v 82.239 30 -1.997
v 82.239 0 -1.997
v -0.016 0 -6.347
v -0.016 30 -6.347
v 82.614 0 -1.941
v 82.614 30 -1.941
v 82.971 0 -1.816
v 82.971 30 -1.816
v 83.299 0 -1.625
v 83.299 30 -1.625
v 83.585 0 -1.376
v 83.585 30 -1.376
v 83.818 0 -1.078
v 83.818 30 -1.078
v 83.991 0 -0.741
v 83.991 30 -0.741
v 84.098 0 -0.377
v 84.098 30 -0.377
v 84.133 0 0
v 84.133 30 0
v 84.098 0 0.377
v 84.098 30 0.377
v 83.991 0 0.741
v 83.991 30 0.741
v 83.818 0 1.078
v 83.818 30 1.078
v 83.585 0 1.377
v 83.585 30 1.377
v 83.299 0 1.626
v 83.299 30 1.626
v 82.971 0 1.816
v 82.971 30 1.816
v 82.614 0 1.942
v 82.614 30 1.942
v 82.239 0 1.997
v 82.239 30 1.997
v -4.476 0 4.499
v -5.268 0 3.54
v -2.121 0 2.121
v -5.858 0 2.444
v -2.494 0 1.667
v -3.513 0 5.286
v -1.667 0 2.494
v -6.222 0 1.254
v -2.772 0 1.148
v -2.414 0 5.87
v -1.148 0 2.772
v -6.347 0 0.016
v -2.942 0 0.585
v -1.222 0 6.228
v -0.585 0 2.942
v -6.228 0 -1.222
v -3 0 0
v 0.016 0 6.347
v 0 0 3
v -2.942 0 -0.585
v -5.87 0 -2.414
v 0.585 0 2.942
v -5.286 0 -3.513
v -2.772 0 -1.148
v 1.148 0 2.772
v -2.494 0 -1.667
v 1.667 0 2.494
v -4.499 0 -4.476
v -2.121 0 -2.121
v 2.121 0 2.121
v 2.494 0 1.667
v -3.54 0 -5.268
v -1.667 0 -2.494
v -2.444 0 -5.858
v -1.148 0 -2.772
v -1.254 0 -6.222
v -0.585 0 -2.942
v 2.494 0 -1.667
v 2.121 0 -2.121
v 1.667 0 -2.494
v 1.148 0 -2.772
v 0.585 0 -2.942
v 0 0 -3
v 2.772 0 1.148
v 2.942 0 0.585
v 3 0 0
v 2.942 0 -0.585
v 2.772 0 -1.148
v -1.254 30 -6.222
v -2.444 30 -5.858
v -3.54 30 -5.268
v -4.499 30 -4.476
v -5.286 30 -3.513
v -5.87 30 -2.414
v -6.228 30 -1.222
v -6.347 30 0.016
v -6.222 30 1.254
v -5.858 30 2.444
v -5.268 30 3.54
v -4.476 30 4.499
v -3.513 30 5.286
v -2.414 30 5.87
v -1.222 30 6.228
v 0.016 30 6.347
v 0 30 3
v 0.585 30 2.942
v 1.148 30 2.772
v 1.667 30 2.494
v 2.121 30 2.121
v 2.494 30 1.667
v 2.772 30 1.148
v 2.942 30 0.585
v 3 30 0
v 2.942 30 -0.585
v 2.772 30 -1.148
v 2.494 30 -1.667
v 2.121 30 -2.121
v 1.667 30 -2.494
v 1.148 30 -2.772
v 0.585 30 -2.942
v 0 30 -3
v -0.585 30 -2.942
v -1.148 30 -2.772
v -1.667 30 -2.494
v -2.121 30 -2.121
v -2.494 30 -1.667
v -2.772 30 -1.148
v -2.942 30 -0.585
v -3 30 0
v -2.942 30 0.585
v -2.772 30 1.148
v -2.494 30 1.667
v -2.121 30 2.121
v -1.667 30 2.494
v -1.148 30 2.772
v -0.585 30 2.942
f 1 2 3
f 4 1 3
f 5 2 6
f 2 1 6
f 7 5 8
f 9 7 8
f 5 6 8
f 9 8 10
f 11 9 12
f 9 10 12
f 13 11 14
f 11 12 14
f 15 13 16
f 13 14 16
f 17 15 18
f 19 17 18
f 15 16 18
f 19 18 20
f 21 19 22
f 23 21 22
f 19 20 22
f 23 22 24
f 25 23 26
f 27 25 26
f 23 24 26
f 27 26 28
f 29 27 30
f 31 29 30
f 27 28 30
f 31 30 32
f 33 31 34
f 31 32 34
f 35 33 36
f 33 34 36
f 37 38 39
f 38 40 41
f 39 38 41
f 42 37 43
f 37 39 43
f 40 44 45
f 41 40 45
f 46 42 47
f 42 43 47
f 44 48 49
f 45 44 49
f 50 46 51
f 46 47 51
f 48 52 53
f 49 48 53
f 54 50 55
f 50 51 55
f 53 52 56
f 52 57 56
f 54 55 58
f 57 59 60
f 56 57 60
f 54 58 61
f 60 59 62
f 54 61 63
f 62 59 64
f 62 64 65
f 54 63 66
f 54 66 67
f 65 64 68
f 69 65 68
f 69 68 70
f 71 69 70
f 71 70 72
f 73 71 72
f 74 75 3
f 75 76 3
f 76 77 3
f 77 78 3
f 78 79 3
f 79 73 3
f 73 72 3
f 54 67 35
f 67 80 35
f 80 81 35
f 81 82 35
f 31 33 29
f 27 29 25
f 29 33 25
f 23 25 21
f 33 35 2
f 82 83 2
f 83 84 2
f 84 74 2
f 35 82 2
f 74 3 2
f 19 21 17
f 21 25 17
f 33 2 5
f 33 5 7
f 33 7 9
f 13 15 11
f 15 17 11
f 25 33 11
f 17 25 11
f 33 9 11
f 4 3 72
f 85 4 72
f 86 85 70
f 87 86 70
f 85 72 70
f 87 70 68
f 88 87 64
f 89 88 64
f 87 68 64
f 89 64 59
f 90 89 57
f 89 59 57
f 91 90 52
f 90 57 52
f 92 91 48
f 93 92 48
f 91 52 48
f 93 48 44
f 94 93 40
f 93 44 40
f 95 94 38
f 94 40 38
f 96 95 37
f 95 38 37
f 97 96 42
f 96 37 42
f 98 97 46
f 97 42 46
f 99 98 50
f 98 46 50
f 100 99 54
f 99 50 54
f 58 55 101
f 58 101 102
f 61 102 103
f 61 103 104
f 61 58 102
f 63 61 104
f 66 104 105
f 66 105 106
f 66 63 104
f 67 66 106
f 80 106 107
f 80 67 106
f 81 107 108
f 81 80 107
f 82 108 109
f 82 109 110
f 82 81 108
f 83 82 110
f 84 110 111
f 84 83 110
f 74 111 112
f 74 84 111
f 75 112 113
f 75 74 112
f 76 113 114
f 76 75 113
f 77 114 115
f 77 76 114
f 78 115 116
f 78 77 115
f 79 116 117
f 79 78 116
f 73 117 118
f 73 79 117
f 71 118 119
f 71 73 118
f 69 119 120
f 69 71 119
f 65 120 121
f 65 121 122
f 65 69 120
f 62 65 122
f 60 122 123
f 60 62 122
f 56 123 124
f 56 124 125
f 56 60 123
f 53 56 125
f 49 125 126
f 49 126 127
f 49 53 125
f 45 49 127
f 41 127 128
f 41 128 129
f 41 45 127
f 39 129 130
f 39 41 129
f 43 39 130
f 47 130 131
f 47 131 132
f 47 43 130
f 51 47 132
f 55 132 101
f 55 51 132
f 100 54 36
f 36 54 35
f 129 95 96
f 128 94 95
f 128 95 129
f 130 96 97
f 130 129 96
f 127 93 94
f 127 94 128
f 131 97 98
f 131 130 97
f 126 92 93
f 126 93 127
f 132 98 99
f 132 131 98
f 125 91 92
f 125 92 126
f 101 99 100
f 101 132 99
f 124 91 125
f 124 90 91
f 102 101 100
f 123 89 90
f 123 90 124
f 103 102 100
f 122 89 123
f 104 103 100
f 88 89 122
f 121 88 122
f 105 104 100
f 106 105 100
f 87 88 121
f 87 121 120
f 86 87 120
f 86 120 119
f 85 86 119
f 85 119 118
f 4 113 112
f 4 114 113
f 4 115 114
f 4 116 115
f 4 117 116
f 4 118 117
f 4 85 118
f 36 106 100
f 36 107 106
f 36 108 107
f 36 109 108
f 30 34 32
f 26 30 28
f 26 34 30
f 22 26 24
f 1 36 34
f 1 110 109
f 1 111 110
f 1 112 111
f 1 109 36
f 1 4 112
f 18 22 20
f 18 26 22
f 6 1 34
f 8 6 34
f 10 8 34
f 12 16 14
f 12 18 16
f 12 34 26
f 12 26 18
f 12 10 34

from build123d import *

# Parameters (mm, degrees)
SKETCH1_R           = 3
BOSS_EXTRUDE1_DEPTH = 30
FILLET1_R           = 2


with BuildPart() as part:
    # Sketch1 → Boss-Extrude1 (new body)
    with BuildSketch(Plane(origin=(0, 0, 0), x_dir=(1, 0, 0), z_dir=(0, 1, 0))):
        with BuildLine():
            Line((120, 0), (-0.016209805, 6.346913517))
            ThreePointArc((-0.016209805, 6.346913517), (-6.346913517, -0.016209805), (0.016209805, -6.346913517))
            Line((0.016209805, -6.346913517), (120, 0))
        make_face()
        with Locations(Location((0, 0, 0), (0, 0, 270))):
            Circle(SKETCH1_R, mode=Mode.SUBTRACT)
    extrude(amount=BOSS_EXTRUDE1_DEPTH)

    # Fillet1
    fillet1_edges = [part.edges().sort_by_distance(p)[0] for p in [
        (120, 15, 0),
    ]]
    fillet(fillet1_edges, radius=FILLET1_R)


solid = part.part
